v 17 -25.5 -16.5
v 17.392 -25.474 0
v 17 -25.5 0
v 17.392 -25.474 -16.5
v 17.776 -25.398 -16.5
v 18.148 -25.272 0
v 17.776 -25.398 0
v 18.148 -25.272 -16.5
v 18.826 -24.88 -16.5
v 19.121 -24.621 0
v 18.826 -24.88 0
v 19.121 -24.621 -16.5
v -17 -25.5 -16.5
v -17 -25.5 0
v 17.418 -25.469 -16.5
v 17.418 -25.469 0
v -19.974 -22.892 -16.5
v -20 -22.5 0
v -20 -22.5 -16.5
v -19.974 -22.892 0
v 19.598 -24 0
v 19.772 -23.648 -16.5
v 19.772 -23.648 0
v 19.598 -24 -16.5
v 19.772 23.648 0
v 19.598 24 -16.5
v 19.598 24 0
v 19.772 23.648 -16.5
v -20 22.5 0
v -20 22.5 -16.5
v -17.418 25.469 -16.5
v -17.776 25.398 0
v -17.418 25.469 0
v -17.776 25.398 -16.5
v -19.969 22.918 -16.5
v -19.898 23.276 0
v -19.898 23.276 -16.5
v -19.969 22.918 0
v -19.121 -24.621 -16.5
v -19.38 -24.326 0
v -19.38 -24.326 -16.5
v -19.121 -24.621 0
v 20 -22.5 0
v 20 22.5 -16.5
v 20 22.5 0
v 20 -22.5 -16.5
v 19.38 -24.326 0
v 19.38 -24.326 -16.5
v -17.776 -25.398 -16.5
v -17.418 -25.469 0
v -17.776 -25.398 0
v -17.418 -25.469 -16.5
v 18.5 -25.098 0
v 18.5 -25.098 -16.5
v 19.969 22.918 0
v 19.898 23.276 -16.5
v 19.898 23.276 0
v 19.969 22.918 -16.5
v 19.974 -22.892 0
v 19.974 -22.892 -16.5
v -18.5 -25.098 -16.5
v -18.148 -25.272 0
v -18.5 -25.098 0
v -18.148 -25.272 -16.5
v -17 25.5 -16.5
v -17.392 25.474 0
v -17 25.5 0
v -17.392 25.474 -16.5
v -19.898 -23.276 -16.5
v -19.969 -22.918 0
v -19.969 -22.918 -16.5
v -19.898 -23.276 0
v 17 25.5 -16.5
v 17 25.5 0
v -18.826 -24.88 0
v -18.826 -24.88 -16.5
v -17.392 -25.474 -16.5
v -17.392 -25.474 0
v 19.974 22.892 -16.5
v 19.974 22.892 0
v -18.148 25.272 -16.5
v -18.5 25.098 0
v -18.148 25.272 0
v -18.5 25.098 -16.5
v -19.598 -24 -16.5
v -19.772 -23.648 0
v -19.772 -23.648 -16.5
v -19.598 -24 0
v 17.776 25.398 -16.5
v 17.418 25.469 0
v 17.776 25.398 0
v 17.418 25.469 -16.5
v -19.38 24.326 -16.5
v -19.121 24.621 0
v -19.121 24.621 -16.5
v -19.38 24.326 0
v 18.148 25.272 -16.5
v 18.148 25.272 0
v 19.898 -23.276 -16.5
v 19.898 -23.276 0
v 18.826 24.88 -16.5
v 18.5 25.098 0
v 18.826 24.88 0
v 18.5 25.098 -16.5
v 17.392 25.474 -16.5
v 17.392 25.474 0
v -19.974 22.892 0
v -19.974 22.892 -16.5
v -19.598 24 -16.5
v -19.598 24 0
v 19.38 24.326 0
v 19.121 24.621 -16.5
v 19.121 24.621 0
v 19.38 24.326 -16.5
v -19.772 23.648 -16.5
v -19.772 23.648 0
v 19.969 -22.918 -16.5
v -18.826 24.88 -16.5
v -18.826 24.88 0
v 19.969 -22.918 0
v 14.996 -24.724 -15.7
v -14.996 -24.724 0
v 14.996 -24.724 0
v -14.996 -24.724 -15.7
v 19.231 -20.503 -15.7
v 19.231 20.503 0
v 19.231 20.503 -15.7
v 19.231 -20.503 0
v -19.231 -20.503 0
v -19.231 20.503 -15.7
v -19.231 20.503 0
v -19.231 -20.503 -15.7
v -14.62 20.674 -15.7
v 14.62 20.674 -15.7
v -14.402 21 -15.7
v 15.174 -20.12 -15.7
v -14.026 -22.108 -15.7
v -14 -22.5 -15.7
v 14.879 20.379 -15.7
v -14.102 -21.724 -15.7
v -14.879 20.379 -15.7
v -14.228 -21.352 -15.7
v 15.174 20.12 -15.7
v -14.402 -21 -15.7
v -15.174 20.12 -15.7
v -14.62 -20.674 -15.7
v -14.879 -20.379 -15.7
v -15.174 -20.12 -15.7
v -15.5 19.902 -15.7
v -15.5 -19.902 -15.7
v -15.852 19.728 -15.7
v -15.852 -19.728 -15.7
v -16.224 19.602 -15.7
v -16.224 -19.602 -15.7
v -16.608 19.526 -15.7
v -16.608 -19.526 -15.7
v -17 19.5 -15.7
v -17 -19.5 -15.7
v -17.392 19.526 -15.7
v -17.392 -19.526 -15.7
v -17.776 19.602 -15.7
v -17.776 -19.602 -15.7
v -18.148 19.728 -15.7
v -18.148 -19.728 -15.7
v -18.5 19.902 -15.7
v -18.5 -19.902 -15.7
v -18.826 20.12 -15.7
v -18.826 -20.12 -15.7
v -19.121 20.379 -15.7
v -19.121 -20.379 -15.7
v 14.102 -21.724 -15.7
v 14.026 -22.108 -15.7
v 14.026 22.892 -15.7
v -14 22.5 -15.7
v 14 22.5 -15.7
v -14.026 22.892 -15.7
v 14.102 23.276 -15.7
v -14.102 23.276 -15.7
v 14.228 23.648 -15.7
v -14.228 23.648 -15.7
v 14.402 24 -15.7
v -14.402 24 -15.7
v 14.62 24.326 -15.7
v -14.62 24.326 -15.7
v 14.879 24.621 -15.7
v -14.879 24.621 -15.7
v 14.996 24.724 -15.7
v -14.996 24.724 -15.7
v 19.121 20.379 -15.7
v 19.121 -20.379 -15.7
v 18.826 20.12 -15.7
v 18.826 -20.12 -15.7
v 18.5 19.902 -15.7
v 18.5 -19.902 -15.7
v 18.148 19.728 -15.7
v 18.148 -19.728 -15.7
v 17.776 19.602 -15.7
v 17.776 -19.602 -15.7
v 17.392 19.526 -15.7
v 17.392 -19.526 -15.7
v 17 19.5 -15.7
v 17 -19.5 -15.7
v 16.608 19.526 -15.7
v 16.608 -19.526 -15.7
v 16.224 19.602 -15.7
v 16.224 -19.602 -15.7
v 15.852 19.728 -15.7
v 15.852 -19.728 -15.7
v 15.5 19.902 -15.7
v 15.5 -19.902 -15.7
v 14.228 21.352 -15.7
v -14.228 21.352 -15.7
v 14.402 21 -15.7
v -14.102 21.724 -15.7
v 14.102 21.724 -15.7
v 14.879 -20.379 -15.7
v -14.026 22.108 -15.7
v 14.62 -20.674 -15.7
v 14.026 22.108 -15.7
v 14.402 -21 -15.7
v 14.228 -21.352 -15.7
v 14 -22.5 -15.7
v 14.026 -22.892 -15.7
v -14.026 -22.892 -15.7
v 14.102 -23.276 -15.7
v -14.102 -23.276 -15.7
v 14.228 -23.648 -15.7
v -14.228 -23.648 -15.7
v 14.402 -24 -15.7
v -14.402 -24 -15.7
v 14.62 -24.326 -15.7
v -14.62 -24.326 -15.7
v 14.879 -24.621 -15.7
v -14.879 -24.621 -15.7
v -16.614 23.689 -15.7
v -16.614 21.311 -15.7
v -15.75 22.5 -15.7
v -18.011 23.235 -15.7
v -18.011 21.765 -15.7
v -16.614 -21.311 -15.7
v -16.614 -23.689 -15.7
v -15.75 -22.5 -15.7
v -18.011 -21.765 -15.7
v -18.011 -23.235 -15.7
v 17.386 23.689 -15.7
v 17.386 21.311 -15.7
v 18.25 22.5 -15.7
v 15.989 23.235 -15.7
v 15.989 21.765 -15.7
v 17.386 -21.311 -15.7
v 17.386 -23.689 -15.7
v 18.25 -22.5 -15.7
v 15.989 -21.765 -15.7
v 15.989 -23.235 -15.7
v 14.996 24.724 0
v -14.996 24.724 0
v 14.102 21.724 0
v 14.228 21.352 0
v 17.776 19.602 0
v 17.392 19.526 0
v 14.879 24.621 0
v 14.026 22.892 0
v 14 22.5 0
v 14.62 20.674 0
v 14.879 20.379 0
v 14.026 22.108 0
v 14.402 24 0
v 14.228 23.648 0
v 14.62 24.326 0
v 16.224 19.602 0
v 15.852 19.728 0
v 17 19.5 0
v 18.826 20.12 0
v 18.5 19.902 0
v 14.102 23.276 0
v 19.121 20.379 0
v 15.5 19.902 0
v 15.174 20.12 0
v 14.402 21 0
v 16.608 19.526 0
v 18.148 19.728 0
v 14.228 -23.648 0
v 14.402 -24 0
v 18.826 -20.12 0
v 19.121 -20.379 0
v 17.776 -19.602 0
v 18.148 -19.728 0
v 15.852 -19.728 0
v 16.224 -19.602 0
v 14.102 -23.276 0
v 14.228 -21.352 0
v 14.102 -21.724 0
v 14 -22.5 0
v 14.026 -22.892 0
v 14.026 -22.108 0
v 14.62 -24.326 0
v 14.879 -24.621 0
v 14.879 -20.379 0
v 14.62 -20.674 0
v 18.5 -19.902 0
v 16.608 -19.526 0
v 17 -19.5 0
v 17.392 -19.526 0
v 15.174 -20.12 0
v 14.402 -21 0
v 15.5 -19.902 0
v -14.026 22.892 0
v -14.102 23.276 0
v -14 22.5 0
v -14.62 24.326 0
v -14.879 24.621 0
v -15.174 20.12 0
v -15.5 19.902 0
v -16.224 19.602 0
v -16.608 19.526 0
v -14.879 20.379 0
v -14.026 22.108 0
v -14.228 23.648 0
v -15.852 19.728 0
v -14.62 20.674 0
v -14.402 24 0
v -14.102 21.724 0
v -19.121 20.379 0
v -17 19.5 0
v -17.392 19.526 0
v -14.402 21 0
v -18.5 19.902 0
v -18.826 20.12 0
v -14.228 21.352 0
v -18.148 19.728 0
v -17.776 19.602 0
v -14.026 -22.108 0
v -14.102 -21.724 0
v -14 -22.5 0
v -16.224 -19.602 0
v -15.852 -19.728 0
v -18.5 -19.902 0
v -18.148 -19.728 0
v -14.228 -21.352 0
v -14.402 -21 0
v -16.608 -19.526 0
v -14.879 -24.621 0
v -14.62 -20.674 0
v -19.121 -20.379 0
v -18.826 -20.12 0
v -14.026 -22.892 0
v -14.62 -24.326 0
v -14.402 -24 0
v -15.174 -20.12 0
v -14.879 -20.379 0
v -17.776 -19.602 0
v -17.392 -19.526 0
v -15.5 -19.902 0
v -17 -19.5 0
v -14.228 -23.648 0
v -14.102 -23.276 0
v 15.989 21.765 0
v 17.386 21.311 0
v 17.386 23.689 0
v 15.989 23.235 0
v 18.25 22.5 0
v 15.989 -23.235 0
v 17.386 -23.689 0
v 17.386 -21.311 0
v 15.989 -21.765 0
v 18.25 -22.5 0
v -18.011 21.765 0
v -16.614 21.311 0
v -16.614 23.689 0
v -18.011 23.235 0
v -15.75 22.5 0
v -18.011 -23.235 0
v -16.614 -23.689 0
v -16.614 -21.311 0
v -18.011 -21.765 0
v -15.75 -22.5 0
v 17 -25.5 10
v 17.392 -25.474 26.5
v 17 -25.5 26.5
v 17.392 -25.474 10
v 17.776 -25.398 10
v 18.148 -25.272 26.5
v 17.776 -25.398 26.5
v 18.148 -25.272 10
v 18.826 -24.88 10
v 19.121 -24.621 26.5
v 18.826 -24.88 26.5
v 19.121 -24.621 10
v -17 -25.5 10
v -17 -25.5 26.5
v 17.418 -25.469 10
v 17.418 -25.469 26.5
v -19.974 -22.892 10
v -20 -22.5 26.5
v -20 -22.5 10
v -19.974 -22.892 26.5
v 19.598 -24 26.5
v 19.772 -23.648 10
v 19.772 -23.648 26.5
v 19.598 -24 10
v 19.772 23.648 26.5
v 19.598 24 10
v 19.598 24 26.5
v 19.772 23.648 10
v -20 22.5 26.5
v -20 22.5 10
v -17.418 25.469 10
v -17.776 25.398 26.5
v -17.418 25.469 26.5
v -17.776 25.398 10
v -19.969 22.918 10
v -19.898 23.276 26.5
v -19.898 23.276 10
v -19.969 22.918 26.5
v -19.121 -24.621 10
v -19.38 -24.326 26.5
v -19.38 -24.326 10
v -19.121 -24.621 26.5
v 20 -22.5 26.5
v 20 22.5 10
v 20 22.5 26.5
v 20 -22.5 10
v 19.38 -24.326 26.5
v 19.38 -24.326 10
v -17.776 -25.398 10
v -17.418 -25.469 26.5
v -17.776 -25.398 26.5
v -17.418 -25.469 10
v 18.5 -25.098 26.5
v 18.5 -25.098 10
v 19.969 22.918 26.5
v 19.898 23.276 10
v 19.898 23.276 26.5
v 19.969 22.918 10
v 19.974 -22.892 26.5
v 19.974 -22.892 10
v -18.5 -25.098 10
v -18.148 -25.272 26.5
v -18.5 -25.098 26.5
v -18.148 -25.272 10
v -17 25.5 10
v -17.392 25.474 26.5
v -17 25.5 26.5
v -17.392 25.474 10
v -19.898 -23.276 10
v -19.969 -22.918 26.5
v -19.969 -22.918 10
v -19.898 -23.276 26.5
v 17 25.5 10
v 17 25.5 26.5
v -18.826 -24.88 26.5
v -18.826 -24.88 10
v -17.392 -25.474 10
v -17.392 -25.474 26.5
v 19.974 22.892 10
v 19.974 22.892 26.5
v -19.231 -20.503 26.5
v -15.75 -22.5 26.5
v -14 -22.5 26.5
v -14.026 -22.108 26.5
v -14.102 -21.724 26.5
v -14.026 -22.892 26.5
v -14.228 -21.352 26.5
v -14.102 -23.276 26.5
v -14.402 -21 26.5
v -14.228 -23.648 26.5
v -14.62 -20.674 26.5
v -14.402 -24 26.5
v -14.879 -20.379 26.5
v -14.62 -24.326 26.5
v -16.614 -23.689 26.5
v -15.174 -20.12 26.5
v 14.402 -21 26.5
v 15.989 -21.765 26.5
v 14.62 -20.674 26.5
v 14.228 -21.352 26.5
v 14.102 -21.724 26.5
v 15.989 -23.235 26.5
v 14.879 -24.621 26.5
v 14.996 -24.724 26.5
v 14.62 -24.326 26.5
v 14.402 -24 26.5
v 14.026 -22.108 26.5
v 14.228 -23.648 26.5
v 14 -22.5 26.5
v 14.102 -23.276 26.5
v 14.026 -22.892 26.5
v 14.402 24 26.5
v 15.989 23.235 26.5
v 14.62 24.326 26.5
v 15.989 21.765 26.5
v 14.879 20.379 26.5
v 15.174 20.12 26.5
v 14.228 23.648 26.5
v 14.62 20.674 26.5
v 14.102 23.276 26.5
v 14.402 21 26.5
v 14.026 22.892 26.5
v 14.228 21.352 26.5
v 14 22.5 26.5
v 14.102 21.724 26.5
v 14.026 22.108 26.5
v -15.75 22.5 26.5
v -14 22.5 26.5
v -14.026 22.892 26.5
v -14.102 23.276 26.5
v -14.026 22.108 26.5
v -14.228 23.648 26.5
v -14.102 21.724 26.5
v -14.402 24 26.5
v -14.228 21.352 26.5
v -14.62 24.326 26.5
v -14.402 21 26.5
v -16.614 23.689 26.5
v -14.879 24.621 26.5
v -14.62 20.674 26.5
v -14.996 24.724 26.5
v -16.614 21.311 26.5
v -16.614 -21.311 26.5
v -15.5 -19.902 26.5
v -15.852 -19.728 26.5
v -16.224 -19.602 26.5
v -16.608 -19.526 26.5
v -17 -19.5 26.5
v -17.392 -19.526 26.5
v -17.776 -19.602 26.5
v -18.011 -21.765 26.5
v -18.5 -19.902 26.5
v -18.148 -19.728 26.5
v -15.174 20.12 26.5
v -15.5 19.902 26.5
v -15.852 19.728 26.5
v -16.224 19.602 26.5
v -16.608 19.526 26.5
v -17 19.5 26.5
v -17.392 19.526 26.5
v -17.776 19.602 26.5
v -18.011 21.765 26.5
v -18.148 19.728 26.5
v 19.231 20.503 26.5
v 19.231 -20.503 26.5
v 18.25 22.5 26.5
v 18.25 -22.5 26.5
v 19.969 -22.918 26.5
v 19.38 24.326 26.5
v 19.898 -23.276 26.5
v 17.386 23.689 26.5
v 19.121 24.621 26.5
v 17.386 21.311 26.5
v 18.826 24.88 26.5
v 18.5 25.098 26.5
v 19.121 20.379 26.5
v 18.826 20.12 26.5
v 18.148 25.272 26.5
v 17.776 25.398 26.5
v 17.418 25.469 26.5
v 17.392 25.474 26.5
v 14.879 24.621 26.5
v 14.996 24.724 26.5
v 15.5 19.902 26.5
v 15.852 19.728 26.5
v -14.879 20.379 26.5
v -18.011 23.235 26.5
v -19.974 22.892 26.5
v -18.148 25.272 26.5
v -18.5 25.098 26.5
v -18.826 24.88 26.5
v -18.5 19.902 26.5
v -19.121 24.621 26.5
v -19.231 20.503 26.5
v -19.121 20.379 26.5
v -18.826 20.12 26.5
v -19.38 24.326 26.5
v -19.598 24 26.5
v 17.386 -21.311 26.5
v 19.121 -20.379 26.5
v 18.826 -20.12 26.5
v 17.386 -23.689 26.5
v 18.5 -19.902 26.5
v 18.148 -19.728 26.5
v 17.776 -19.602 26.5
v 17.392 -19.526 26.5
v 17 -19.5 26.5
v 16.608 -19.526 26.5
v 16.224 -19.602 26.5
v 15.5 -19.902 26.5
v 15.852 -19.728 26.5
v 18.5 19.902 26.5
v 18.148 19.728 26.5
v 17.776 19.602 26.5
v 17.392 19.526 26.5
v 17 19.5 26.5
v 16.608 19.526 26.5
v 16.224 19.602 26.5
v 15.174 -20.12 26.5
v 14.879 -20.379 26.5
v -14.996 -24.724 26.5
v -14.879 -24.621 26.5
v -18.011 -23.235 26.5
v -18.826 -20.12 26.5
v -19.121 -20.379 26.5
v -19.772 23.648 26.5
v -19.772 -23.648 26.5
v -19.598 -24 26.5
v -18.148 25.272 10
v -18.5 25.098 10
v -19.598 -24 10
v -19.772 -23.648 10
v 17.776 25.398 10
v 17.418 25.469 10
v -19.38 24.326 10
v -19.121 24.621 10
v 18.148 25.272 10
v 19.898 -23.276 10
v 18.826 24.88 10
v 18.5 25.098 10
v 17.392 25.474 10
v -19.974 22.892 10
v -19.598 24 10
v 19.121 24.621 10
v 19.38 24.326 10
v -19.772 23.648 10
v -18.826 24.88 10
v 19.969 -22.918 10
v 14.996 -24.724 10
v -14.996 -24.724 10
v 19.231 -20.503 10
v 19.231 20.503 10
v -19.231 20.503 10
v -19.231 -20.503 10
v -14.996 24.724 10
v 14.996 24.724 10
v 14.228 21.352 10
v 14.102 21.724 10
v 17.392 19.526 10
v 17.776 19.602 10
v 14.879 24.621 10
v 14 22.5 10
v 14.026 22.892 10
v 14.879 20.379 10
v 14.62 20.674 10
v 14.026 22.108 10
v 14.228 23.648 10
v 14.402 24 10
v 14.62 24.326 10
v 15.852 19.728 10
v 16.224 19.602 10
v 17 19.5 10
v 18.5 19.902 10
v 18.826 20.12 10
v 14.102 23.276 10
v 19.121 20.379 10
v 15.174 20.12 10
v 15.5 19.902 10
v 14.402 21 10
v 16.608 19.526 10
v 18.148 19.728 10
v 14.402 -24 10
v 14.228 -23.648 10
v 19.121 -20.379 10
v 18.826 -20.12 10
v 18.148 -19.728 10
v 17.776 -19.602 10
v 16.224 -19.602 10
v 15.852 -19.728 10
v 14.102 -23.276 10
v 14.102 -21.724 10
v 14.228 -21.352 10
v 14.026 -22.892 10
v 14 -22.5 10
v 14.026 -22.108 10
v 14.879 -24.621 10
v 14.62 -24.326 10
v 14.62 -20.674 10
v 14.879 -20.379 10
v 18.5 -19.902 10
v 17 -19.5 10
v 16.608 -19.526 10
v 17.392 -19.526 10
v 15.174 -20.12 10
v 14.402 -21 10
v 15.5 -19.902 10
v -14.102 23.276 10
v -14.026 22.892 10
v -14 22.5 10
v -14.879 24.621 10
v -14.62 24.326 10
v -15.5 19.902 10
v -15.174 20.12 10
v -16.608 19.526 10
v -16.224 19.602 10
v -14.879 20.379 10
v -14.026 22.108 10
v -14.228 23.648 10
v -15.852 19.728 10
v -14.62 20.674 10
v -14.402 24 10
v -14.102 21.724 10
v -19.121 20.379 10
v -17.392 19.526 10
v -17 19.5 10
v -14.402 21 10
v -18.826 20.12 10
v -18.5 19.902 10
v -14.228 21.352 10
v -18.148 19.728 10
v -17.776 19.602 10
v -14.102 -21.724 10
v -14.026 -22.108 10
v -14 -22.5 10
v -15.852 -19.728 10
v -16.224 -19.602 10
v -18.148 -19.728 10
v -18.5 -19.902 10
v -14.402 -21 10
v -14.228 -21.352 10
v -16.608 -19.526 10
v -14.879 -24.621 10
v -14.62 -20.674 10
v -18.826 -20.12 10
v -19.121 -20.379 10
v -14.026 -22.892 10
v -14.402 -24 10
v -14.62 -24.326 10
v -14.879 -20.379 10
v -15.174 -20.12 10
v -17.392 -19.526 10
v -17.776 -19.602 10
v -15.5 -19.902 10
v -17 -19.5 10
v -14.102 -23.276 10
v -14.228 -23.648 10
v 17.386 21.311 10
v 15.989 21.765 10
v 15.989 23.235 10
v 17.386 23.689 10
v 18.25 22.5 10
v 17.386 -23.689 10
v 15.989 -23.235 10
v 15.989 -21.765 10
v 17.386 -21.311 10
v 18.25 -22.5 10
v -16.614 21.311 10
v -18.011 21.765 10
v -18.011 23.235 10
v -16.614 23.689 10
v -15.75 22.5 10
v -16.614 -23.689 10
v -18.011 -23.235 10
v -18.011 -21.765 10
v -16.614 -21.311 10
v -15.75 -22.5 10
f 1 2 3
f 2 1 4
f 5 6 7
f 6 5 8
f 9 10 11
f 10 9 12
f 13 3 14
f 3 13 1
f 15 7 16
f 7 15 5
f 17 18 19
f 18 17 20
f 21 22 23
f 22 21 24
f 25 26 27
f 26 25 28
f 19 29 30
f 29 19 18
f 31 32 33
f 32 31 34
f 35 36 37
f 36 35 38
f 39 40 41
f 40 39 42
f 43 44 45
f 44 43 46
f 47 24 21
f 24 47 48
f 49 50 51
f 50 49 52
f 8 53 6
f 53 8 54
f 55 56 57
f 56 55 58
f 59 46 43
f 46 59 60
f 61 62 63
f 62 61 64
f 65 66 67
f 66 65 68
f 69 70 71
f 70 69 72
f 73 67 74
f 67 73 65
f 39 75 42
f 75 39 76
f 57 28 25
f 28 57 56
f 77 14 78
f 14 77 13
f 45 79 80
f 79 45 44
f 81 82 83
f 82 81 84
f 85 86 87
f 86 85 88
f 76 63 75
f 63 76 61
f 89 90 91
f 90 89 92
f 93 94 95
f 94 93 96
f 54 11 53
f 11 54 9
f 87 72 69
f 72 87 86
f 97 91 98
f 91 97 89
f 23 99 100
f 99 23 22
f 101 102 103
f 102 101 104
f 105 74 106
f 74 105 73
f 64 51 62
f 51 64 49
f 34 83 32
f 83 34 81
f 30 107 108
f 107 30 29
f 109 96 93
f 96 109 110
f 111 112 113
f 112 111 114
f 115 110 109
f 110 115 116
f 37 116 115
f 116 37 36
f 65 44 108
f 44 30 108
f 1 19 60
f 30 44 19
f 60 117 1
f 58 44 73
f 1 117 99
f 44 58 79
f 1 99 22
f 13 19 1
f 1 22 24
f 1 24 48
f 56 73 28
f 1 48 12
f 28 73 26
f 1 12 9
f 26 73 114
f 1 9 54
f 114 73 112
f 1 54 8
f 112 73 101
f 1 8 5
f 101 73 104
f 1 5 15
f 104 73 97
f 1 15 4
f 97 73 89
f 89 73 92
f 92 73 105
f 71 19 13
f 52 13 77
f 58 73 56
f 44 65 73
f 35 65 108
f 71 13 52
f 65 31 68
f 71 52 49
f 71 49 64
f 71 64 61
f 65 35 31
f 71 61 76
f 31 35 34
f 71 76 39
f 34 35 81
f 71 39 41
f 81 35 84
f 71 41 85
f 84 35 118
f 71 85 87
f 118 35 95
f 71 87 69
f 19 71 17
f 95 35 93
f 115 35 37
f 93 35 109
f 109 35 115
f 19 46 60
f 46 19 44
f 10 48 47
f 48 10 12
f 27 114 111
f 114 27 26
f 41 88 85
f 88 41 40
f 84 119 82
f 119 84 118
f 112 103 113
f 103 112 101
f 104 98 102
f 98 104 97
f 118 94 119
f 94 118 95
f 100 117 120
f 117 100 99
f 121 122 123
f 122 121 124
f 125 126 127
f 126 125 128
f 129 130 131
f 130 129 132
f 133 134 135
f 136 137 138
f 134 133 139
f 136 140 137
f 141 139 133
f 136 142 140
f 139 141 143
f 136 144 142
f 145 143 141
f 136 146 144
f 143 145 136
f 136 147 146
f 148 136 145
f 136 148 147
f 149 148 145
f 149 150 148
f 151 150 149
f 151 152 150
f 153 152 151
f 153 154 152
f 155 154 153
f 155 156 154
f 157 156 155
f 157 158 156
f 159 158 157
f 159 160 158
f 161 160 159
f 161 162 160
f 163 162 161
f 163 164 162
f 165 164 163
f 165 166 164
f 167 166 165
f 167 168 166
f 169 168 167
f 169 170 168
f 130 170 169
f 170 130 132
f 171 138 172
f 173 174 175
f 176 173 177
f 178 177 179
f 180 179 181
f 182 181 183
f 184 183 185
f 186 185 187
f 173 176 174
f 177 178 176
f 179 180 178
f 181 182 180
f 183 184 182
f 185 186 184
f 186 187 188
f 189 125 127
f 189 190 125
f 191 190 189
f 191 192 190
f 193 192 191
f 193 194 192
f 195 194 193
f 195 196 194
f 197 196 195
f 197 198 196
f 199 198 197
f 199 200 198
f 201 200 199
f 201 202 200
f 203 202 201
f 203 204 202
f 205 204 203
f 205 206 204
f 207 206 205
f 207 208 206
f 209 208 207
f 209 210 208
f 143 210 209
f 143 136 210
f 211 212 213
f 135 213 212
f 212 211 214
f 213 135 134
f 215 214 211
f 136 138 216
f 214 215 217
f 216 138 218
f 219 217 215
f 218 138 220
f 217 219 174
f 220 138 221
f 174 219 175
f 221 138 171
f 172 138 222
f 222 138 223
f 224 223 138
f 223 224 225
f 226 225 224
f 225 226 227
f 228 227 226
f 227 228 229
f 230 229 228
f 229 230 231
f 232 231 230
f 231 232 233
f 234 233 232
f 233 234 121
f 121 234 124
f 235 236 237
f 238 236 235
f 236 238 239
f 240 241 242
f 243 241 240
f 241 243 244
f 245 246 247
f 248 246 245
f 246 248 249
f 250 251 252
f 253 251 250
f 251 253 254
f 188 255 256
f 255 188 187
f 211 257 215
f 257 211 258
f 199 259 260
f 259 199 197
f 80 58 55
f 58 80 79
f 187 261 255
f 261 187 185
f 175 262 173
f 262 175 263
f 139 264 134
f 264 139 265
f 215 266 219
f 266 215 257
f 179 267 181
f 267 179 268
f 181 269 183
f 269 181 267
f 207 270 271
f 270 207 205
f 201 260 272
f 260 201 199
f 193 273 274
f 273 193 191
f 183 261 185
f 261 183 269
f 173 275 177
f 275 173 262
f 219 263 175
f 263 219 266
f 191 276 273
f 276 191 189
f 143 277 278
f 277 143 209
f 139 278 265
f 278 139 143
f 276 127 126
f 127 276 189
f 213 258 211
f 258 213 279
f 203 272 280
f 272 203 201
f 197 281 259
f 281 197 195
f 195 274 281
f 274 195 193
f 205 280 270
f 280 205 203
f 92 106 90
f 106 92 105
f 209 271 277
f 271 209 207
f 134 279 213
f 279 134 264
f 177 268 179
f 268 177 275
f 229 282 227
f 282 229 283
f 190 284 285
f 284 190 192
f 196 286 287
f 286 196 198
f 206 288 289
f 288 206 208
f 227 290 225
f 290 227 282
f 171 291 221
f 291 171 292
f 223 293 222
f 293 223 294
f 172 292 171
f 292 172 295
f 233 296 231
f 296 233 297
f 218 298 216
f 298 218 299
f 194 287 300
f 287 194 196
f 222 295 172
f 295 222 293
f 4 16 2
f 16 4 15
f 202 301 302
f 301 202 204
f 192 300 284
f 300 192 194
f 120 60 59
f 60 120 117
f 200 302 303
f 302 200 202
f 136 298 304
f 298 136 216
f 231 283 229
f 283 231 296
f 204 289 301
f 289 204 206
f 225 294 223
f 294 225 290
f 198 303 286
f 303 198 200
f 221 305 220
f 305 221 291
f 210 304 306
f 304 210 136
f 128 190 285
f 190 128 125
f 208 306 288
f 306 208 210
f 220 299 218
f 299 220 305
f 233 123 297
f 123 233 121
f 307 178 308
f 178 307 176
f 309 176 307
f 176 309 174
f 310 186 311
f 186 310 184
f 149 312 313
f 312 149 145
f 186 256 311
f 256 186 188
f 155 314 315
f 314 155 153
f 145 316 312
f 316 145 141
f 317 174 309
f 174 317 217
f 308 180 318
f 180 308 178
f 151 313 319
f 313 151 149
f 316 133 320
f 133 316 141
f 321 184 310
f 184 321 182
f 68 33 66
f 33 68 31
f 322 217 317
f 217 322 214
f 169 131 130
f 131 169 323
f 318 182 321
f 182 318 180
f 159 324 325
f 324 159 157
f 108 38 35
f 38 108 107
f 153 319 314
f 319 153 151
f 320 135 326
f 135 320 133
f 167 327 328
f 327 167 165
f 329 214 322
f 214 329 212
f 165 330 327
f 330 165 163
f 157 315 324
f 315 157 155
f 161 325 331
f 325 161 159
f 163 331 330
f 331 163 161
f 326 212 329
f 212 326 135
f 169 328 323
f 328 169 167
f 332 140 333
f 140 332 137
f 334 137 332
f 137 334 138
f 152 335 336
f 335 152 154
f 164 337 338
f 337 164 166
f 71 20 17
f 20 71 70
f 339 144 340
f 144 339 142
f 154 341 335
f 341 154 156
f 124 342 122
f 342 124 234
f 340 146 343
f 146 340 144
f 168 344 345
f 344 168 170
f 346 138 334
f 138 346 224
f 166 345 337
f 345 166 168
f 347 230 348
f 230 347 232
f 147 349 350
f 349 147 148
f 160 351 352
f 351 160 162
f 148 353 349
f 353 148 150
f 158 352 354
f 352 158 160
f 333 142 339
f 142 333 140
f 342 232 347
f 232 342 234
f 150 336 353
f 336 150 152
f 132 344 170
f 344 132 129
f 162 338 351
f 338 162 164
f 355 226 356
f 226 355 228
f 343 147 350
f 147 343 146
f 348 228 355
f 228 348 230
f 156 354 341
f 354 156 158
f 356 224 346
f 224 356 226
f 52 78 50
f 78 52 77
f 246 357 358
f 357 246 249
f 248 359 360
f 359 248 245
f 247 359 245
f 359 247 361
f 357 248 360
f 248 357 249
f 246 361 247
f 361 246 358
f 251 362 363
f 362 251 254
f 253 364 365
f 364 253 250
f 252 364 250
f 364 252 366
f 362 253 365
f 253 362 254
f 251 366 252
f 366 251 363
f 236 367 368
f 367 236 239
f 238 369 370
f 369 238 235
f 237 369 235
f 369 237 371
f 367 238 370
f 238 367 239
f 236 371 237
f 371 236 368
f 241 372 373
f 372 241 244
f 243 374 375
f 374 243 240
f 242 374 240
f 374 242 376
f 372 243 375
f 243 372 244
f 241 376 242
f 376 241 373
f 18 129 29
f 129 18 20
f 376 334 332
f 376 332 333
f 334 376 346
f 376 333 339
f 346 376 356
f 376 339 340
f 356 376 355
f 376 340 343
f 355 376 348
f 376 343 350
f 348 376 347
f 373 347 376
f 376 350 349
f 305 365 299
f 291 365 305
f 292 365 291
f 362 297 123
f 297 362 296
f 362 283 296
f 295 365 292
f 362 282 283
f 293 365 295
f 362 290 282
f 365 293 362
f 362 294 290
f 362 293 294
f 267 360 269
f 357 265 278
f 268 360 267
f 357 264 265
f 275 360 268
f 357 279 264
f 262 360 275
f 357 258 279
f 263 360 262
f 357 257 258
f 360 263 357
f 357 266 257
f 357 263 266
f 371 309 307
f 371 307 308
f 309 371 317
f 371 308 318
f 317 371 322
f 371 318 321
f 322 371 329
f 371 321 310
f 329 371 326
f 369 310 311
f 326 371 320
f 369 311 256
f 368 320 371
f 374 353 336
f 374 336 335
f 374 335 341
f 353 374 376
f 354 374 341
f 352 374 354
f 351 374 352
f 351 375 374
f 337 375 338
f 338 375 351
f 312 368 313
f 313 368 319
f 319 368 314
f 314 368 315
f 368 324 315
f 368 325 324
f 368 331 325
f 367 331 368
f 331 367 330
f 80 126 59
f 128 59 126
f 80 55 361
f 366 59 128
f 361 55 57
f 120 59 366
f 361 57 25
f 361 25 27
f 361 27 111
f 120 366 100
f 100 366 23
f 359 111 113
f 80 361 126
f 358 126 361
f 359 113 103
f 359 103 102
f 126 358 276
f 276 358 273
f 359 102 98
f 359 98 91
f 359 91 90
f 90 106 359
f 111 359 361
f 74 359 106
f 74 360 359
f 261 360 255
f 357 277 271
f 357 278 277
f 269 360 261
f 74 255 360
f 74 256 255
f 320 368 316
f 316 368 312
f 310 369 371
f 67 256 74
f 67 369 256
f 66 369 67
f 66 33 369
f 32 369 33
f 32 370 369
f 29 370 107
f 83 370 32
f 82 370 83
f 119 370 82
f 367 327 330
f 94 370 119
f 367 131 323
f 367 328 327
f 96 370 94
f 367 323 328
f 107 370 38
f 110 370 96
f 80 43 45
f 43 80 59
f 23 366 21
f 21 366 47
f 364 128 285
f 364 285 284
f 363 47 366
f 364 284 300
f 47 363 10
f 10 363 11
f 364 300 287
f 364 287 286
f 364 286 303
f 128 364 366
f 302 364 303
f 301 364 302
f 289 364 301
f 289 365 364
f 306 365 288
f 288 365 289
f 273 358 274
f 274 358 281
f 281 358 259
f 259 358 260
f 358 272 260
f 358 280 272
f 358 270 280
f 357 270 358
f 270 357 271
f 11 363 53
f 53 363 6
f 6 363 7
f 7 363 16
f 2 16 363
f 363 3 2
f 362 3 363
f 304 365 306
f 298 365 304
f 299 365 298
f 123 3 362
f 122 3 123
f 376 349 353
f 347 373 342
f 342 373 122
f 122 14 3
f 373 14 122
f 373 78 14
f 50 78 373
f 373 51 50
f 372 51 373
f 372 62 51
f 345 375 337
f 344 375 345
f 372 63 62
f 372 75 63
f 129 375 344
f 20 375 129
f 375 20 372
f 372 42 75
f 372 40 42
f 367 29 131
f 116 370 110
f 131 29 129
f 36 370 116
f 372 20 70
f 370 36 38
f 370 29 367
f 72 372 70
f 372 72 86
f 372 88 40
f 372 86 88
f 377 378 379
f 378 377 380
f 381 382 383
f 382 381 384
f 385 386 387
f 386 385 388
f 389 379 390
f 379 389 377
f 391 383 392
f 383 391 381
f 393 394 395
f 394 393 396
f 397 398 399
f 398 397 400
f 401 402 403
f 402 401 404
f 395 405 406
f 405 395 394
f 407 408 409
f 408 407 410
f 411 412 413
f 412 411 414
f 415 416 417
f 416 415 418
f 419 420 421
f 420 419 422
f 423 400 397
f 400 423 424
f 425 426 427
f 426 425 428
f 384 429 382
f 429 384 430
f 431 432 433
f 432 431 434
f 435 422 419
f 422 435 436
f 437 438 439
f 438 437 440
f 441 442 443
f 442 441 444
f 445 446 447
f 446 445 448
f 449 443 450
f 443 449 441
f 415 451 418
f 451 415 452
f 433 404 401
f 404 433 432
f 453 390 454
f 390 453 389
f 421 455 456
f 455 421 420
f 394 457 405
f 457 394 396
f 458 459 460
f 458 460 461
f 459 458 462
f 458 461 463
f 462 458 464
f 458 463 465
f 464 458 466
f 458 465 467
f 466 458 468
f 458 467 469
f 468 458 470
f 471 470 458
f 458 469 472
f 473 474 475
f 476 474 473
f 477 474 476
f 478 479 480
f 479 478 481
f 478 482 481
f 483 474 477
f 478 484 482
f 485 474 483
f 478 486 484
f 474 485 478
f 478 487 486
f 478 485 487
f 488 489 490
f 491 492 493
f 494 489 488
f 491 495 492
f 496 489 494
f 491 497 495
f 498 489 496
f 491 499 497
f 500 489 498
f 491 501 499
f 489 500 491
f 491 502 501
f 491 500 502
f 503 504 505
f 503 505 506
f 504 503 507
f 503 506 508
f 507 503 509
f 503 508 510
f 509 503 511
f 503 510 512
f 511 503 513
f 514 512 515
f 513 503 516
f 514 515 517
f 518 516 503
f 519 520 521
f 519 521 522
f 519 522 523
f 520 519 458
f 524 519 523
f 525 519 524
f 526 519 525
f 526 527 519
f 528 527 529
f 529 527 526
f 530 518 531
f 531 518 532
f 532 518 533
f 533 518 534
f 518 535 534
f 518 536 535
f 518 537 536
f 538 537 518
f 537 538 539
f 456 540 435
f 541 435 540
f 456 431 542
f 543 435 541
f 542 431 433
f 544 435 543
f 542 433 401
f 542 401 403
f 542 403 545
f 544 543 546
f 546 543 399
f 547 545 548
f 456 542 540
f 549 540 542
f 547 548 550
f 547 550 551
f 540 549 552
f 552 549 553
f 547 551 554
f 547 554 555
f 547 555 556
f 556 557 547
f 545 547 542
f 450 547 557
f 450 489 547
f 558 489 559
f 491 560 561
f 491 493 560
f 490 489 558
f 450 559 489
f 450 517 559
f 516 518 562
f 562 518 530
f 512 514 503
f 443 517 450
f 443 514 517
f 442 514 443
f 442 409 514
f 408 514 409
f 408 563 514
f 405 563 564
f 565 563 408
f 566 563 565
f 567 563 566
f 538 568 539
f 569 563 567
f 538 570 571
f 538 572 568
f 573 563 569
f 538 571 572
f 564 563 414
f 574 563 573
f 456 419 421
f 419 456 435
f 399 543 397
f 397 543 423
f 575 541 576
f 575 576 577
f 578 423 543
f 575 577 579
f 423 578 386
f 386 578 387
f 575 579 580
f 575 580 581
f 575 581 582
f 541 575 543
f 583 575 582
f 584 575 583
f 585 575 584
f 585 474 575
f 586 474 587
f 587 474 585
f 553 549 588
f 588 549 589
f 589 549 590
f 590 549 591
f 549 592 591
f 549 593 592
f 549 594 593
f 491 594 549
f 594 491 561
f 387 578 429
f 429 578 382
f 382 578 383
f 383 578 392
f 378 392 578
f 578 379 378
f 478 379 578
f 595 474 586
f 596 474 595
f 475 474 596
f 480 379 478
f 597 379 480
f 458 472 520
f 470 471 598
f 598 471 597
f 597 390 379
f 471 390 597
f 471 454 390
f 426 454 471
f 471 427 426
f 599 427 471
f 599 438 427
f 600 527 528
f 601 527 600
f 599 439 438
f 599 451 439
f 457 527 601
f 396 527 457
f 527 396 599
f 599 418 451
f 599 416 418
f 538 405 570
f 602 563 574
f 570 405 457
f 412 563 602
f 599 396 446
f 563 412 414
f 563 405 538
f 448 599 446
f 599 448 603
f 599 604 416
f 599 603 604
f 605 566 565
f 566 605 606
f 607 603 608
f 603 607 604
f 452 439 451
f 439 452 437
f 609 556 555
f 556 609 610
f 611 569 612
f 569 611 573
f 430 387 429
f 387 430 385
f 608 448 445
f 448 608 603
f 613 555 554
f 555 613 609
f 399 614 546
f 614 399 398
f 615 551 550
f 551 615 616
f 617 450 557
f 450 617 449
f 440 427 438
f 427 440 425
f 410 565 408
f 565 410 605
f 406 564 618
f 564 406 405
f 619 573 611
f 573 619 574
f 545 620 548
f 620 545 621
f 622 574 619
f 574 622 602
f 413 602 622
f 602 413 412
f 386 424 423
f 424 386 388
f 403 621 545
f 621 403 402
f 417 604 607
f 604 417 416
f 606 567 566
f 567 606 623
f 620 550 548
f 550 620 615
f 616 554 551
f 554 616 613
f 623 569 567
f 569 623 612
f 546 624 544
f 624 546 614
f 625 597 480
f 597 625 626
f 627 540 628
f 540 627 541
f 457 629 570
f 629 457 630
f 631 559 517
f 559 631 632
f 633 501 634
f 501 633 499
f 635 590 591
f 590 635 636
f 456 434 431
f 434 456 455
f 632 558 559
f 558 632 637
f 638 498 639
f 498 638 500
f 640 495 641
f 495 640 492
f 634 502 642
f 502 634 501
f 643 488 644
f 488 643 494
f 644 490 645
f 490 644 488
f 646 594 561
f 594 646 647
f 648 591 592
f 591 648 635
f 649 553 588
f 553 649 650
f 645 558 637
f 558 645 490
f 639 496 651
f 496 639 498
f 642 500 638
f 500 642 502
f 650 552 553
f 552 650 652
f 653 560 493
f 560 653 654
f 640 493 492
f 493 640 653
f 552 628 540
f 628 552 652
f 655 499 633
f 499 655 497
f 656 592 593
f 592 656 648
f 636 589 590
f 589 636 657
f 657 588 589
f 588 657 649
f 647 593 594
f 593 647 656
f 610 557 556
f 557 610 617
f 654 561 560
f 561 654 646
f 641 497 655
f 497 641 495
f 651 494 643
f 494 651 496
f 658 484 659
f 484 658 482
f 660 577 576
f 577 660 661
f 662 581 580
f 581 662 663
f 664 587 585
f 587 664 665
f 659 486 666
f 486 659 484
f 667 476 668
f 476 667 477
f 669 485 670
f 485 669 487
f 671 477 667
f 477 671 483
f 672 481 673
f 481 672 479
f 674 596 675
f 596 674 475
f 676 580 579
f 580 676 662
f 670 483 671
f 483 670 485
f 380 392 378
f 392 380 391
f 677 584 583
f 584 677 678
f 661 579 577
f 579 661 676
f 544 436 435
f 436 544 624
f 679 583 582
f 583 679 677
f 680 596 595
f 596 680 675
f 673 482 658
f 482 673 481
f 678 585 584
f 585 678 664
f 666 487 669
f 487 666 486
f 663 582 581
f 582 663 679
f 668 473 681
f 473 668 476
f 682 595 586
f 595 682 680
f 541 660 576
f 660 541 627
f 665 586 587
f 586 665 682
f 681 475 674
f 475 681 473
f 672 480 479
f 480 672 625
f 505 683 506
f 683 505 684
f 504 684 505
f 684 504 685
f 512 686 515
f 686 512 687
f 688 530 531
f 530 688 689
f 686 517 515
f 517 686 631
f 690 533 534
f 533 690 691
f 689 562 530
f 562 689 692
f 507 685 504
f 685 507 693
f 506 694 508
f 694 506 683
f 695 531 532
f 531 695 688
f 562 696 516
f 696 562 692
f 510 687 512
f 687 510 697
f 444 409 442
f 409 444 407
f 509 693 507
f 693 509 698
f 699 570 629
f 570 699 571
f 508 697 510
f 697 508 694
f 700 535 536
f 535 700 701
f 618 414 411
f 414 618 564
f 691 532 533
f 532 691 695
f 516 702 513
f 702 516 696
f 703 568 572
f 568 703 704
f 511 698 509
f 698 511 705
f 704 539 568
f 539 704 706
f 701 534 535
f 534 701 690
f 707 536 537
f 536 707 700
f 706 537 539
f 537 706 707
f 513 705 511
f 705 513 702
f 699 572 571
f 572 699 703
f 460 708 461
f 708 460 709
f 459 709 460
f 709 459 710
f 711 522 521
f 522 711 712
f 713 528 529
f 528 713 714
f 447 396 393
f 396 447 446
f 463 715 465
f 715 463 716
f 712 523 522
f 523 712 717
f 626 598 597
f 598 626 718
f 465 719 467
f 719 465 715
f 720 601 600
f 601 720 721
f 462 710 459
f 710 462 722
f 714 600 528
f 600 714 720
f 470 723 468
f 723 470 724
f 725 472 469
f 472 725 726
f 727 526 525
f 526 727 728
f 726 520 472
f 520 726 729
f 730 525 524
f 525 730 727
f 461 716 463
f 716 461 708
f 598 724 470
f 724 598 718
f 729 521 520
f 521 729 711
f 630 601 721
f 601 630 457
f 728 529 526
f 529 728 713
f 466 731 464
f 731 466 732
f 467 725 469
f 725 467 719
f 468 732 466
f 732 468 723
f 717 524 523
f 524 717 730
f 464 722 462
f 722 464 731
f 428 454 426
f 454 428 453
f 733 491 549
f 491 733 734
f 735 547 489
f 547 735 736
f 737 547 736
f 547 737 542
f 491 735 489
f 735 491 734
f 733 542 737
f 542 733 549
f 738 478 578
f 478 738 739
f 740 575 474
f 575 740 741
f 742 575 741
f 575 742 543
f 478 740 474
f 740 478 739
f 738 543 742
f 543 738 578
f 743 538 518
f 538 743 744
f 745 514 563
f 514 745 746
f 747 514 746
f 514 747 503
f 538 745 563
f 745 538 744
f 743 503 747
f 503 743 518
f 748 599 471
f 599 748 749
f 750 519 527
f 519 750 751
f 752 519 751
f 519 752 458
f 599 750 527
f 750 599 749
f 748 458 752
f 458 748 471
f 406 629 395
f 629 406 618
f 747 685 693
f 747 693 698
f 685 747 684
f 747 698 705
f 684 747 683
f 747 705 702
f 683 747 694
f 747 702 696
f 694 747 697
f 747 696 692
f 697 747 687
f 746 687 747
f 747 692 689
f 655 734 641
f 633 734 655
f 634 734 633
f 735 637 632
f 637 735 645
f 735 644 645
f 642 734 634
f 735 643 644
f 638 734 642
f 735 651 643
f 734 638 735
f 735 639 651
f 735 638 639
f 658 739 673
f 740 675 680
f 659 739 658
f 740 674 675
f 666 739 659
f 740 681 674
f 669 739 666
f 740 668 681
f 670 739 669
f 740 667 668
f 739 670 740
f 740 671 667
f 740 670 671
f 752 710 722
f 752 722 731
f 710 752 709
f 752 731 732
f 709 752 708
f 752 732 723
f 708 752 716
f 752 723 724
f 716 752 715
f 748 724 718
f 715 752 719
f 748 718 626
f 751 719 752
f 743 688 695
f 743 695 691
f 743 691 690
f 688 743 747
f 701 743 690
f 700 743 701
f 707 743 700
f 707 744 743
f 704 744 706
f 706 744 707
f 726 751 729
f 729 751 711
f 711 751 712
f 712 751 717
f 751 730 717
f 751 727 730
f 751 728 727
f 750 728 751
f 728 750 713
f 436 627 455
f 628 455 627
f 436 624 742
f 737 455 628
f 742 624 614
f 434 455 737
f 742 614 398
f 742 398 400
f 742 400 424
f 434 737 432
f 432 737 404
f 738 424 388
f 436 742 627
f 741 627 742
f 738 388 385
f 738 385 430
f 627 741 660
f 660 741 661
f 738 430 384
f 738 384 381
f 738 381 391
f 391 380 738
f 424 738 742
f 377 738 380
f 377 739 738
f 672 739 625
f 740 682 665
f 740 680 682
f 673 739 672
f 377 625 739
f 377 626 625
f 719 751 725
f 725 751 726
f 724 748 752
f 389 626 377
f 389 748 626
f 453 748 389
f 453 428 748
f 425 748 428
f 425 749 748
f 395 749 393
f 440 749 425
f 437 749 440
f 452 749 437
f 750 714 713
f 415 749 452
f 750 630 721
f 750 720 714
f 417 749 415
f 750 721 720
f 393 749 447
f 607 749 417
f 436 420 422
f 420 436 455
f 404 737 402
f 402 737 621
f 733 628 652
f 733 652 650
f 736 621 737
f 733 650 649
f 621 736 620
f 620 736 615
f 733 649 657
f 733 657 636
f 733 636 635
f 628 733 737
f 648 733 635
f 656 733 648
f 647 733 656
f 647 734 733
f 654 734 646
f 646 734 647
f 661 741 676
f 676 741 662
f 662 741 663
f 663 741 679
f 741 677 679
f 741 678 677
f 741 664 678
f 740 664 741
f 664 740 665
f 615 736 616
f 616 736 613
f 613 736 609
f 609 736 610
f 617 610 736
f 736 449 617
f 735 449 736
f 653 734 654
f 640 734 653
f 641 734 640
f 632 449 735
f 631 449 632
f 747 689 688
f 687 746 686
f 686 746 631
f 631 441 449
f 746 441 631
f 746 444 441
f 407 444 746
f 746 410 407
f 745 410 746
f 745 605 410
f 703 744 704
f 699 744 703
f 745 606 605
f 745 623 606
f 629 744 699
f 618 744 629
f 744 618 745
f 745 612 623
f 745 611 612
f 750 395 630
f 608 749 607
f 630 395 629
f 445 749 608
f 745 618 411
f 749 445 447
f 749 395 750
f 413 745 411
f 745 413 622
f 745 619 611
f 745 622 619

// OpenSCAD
// definitions

// box dimensions
w = 40;
l = 51;
d = 33;

nozzle = 0.4; // nozzle diameter
thick = nozzle*4;
fillet = 3;

// MAX chip location, used also for bolts and mounts
x_MAX = -w/2+1.3;
y_MAX = 0;
z_MAX = 1;

// set up modules

module outer(width, length, depth, fillet) {
    linear_extrude(depth, center = true)
    offset(r = +fillet) offset(delta = -fillet) {
        square([width, length], center = true);
    }
}

module bolt_mounts(w, l, d, fillet, diam) {
    x = w/2-fillet;
    y = l/2-fillet;
    points = [[x,y,0], [x,-y,0], [-x,y,0], [-x,-y,0]];
    module mounts() {
        for (p = points){
            translate(p) cylinder(r=fillet, h=d, center=true);
        }
    }
    module holes() {
        points = [[x,y,0.1], [x,-y,0.1], [-x,y,0.1], [-x,-y,0.1]];
        for (p = points){
            translate(p) cylinder(d=diam, h=d, center=true, $fn = 5);
        }
    }
    difference(){
        mounts();
        holes();
    }
}

module r_box(width, length, depth, thickness, fillet) {
	difference() {
        // main box
        // outer
        outer(width = width, length = length, depth = depth, fillet = fillet);
        // inner
        translate([0, 0, thickness/2])
        scale([width/(width+thickness), length/(length+thickness), 1]) // [x,y,z]
        outer(width = width, length = length, depth = depth, fillet = fillet);
    }
}

// enclosure
module enclosure() {
    $fa = 1;
    $fs = 0.4;
    union() {
        r_box(width = w, length = l, depth = d, thickness = thick, fillet = fillet);
        bolt_mounts(w, l, d, fillet = fillet, diam = 2.5);
    }
}

module mycut() {
    off = 2; // offet
    translate([0,0,d/4]) cube([w+off, l+off, d/2], center = true);
}

difference() {
    enclosure();
    mycut();
}

translate([0,0,10])
intersection() {
    enclosure();
    mycut();
}
